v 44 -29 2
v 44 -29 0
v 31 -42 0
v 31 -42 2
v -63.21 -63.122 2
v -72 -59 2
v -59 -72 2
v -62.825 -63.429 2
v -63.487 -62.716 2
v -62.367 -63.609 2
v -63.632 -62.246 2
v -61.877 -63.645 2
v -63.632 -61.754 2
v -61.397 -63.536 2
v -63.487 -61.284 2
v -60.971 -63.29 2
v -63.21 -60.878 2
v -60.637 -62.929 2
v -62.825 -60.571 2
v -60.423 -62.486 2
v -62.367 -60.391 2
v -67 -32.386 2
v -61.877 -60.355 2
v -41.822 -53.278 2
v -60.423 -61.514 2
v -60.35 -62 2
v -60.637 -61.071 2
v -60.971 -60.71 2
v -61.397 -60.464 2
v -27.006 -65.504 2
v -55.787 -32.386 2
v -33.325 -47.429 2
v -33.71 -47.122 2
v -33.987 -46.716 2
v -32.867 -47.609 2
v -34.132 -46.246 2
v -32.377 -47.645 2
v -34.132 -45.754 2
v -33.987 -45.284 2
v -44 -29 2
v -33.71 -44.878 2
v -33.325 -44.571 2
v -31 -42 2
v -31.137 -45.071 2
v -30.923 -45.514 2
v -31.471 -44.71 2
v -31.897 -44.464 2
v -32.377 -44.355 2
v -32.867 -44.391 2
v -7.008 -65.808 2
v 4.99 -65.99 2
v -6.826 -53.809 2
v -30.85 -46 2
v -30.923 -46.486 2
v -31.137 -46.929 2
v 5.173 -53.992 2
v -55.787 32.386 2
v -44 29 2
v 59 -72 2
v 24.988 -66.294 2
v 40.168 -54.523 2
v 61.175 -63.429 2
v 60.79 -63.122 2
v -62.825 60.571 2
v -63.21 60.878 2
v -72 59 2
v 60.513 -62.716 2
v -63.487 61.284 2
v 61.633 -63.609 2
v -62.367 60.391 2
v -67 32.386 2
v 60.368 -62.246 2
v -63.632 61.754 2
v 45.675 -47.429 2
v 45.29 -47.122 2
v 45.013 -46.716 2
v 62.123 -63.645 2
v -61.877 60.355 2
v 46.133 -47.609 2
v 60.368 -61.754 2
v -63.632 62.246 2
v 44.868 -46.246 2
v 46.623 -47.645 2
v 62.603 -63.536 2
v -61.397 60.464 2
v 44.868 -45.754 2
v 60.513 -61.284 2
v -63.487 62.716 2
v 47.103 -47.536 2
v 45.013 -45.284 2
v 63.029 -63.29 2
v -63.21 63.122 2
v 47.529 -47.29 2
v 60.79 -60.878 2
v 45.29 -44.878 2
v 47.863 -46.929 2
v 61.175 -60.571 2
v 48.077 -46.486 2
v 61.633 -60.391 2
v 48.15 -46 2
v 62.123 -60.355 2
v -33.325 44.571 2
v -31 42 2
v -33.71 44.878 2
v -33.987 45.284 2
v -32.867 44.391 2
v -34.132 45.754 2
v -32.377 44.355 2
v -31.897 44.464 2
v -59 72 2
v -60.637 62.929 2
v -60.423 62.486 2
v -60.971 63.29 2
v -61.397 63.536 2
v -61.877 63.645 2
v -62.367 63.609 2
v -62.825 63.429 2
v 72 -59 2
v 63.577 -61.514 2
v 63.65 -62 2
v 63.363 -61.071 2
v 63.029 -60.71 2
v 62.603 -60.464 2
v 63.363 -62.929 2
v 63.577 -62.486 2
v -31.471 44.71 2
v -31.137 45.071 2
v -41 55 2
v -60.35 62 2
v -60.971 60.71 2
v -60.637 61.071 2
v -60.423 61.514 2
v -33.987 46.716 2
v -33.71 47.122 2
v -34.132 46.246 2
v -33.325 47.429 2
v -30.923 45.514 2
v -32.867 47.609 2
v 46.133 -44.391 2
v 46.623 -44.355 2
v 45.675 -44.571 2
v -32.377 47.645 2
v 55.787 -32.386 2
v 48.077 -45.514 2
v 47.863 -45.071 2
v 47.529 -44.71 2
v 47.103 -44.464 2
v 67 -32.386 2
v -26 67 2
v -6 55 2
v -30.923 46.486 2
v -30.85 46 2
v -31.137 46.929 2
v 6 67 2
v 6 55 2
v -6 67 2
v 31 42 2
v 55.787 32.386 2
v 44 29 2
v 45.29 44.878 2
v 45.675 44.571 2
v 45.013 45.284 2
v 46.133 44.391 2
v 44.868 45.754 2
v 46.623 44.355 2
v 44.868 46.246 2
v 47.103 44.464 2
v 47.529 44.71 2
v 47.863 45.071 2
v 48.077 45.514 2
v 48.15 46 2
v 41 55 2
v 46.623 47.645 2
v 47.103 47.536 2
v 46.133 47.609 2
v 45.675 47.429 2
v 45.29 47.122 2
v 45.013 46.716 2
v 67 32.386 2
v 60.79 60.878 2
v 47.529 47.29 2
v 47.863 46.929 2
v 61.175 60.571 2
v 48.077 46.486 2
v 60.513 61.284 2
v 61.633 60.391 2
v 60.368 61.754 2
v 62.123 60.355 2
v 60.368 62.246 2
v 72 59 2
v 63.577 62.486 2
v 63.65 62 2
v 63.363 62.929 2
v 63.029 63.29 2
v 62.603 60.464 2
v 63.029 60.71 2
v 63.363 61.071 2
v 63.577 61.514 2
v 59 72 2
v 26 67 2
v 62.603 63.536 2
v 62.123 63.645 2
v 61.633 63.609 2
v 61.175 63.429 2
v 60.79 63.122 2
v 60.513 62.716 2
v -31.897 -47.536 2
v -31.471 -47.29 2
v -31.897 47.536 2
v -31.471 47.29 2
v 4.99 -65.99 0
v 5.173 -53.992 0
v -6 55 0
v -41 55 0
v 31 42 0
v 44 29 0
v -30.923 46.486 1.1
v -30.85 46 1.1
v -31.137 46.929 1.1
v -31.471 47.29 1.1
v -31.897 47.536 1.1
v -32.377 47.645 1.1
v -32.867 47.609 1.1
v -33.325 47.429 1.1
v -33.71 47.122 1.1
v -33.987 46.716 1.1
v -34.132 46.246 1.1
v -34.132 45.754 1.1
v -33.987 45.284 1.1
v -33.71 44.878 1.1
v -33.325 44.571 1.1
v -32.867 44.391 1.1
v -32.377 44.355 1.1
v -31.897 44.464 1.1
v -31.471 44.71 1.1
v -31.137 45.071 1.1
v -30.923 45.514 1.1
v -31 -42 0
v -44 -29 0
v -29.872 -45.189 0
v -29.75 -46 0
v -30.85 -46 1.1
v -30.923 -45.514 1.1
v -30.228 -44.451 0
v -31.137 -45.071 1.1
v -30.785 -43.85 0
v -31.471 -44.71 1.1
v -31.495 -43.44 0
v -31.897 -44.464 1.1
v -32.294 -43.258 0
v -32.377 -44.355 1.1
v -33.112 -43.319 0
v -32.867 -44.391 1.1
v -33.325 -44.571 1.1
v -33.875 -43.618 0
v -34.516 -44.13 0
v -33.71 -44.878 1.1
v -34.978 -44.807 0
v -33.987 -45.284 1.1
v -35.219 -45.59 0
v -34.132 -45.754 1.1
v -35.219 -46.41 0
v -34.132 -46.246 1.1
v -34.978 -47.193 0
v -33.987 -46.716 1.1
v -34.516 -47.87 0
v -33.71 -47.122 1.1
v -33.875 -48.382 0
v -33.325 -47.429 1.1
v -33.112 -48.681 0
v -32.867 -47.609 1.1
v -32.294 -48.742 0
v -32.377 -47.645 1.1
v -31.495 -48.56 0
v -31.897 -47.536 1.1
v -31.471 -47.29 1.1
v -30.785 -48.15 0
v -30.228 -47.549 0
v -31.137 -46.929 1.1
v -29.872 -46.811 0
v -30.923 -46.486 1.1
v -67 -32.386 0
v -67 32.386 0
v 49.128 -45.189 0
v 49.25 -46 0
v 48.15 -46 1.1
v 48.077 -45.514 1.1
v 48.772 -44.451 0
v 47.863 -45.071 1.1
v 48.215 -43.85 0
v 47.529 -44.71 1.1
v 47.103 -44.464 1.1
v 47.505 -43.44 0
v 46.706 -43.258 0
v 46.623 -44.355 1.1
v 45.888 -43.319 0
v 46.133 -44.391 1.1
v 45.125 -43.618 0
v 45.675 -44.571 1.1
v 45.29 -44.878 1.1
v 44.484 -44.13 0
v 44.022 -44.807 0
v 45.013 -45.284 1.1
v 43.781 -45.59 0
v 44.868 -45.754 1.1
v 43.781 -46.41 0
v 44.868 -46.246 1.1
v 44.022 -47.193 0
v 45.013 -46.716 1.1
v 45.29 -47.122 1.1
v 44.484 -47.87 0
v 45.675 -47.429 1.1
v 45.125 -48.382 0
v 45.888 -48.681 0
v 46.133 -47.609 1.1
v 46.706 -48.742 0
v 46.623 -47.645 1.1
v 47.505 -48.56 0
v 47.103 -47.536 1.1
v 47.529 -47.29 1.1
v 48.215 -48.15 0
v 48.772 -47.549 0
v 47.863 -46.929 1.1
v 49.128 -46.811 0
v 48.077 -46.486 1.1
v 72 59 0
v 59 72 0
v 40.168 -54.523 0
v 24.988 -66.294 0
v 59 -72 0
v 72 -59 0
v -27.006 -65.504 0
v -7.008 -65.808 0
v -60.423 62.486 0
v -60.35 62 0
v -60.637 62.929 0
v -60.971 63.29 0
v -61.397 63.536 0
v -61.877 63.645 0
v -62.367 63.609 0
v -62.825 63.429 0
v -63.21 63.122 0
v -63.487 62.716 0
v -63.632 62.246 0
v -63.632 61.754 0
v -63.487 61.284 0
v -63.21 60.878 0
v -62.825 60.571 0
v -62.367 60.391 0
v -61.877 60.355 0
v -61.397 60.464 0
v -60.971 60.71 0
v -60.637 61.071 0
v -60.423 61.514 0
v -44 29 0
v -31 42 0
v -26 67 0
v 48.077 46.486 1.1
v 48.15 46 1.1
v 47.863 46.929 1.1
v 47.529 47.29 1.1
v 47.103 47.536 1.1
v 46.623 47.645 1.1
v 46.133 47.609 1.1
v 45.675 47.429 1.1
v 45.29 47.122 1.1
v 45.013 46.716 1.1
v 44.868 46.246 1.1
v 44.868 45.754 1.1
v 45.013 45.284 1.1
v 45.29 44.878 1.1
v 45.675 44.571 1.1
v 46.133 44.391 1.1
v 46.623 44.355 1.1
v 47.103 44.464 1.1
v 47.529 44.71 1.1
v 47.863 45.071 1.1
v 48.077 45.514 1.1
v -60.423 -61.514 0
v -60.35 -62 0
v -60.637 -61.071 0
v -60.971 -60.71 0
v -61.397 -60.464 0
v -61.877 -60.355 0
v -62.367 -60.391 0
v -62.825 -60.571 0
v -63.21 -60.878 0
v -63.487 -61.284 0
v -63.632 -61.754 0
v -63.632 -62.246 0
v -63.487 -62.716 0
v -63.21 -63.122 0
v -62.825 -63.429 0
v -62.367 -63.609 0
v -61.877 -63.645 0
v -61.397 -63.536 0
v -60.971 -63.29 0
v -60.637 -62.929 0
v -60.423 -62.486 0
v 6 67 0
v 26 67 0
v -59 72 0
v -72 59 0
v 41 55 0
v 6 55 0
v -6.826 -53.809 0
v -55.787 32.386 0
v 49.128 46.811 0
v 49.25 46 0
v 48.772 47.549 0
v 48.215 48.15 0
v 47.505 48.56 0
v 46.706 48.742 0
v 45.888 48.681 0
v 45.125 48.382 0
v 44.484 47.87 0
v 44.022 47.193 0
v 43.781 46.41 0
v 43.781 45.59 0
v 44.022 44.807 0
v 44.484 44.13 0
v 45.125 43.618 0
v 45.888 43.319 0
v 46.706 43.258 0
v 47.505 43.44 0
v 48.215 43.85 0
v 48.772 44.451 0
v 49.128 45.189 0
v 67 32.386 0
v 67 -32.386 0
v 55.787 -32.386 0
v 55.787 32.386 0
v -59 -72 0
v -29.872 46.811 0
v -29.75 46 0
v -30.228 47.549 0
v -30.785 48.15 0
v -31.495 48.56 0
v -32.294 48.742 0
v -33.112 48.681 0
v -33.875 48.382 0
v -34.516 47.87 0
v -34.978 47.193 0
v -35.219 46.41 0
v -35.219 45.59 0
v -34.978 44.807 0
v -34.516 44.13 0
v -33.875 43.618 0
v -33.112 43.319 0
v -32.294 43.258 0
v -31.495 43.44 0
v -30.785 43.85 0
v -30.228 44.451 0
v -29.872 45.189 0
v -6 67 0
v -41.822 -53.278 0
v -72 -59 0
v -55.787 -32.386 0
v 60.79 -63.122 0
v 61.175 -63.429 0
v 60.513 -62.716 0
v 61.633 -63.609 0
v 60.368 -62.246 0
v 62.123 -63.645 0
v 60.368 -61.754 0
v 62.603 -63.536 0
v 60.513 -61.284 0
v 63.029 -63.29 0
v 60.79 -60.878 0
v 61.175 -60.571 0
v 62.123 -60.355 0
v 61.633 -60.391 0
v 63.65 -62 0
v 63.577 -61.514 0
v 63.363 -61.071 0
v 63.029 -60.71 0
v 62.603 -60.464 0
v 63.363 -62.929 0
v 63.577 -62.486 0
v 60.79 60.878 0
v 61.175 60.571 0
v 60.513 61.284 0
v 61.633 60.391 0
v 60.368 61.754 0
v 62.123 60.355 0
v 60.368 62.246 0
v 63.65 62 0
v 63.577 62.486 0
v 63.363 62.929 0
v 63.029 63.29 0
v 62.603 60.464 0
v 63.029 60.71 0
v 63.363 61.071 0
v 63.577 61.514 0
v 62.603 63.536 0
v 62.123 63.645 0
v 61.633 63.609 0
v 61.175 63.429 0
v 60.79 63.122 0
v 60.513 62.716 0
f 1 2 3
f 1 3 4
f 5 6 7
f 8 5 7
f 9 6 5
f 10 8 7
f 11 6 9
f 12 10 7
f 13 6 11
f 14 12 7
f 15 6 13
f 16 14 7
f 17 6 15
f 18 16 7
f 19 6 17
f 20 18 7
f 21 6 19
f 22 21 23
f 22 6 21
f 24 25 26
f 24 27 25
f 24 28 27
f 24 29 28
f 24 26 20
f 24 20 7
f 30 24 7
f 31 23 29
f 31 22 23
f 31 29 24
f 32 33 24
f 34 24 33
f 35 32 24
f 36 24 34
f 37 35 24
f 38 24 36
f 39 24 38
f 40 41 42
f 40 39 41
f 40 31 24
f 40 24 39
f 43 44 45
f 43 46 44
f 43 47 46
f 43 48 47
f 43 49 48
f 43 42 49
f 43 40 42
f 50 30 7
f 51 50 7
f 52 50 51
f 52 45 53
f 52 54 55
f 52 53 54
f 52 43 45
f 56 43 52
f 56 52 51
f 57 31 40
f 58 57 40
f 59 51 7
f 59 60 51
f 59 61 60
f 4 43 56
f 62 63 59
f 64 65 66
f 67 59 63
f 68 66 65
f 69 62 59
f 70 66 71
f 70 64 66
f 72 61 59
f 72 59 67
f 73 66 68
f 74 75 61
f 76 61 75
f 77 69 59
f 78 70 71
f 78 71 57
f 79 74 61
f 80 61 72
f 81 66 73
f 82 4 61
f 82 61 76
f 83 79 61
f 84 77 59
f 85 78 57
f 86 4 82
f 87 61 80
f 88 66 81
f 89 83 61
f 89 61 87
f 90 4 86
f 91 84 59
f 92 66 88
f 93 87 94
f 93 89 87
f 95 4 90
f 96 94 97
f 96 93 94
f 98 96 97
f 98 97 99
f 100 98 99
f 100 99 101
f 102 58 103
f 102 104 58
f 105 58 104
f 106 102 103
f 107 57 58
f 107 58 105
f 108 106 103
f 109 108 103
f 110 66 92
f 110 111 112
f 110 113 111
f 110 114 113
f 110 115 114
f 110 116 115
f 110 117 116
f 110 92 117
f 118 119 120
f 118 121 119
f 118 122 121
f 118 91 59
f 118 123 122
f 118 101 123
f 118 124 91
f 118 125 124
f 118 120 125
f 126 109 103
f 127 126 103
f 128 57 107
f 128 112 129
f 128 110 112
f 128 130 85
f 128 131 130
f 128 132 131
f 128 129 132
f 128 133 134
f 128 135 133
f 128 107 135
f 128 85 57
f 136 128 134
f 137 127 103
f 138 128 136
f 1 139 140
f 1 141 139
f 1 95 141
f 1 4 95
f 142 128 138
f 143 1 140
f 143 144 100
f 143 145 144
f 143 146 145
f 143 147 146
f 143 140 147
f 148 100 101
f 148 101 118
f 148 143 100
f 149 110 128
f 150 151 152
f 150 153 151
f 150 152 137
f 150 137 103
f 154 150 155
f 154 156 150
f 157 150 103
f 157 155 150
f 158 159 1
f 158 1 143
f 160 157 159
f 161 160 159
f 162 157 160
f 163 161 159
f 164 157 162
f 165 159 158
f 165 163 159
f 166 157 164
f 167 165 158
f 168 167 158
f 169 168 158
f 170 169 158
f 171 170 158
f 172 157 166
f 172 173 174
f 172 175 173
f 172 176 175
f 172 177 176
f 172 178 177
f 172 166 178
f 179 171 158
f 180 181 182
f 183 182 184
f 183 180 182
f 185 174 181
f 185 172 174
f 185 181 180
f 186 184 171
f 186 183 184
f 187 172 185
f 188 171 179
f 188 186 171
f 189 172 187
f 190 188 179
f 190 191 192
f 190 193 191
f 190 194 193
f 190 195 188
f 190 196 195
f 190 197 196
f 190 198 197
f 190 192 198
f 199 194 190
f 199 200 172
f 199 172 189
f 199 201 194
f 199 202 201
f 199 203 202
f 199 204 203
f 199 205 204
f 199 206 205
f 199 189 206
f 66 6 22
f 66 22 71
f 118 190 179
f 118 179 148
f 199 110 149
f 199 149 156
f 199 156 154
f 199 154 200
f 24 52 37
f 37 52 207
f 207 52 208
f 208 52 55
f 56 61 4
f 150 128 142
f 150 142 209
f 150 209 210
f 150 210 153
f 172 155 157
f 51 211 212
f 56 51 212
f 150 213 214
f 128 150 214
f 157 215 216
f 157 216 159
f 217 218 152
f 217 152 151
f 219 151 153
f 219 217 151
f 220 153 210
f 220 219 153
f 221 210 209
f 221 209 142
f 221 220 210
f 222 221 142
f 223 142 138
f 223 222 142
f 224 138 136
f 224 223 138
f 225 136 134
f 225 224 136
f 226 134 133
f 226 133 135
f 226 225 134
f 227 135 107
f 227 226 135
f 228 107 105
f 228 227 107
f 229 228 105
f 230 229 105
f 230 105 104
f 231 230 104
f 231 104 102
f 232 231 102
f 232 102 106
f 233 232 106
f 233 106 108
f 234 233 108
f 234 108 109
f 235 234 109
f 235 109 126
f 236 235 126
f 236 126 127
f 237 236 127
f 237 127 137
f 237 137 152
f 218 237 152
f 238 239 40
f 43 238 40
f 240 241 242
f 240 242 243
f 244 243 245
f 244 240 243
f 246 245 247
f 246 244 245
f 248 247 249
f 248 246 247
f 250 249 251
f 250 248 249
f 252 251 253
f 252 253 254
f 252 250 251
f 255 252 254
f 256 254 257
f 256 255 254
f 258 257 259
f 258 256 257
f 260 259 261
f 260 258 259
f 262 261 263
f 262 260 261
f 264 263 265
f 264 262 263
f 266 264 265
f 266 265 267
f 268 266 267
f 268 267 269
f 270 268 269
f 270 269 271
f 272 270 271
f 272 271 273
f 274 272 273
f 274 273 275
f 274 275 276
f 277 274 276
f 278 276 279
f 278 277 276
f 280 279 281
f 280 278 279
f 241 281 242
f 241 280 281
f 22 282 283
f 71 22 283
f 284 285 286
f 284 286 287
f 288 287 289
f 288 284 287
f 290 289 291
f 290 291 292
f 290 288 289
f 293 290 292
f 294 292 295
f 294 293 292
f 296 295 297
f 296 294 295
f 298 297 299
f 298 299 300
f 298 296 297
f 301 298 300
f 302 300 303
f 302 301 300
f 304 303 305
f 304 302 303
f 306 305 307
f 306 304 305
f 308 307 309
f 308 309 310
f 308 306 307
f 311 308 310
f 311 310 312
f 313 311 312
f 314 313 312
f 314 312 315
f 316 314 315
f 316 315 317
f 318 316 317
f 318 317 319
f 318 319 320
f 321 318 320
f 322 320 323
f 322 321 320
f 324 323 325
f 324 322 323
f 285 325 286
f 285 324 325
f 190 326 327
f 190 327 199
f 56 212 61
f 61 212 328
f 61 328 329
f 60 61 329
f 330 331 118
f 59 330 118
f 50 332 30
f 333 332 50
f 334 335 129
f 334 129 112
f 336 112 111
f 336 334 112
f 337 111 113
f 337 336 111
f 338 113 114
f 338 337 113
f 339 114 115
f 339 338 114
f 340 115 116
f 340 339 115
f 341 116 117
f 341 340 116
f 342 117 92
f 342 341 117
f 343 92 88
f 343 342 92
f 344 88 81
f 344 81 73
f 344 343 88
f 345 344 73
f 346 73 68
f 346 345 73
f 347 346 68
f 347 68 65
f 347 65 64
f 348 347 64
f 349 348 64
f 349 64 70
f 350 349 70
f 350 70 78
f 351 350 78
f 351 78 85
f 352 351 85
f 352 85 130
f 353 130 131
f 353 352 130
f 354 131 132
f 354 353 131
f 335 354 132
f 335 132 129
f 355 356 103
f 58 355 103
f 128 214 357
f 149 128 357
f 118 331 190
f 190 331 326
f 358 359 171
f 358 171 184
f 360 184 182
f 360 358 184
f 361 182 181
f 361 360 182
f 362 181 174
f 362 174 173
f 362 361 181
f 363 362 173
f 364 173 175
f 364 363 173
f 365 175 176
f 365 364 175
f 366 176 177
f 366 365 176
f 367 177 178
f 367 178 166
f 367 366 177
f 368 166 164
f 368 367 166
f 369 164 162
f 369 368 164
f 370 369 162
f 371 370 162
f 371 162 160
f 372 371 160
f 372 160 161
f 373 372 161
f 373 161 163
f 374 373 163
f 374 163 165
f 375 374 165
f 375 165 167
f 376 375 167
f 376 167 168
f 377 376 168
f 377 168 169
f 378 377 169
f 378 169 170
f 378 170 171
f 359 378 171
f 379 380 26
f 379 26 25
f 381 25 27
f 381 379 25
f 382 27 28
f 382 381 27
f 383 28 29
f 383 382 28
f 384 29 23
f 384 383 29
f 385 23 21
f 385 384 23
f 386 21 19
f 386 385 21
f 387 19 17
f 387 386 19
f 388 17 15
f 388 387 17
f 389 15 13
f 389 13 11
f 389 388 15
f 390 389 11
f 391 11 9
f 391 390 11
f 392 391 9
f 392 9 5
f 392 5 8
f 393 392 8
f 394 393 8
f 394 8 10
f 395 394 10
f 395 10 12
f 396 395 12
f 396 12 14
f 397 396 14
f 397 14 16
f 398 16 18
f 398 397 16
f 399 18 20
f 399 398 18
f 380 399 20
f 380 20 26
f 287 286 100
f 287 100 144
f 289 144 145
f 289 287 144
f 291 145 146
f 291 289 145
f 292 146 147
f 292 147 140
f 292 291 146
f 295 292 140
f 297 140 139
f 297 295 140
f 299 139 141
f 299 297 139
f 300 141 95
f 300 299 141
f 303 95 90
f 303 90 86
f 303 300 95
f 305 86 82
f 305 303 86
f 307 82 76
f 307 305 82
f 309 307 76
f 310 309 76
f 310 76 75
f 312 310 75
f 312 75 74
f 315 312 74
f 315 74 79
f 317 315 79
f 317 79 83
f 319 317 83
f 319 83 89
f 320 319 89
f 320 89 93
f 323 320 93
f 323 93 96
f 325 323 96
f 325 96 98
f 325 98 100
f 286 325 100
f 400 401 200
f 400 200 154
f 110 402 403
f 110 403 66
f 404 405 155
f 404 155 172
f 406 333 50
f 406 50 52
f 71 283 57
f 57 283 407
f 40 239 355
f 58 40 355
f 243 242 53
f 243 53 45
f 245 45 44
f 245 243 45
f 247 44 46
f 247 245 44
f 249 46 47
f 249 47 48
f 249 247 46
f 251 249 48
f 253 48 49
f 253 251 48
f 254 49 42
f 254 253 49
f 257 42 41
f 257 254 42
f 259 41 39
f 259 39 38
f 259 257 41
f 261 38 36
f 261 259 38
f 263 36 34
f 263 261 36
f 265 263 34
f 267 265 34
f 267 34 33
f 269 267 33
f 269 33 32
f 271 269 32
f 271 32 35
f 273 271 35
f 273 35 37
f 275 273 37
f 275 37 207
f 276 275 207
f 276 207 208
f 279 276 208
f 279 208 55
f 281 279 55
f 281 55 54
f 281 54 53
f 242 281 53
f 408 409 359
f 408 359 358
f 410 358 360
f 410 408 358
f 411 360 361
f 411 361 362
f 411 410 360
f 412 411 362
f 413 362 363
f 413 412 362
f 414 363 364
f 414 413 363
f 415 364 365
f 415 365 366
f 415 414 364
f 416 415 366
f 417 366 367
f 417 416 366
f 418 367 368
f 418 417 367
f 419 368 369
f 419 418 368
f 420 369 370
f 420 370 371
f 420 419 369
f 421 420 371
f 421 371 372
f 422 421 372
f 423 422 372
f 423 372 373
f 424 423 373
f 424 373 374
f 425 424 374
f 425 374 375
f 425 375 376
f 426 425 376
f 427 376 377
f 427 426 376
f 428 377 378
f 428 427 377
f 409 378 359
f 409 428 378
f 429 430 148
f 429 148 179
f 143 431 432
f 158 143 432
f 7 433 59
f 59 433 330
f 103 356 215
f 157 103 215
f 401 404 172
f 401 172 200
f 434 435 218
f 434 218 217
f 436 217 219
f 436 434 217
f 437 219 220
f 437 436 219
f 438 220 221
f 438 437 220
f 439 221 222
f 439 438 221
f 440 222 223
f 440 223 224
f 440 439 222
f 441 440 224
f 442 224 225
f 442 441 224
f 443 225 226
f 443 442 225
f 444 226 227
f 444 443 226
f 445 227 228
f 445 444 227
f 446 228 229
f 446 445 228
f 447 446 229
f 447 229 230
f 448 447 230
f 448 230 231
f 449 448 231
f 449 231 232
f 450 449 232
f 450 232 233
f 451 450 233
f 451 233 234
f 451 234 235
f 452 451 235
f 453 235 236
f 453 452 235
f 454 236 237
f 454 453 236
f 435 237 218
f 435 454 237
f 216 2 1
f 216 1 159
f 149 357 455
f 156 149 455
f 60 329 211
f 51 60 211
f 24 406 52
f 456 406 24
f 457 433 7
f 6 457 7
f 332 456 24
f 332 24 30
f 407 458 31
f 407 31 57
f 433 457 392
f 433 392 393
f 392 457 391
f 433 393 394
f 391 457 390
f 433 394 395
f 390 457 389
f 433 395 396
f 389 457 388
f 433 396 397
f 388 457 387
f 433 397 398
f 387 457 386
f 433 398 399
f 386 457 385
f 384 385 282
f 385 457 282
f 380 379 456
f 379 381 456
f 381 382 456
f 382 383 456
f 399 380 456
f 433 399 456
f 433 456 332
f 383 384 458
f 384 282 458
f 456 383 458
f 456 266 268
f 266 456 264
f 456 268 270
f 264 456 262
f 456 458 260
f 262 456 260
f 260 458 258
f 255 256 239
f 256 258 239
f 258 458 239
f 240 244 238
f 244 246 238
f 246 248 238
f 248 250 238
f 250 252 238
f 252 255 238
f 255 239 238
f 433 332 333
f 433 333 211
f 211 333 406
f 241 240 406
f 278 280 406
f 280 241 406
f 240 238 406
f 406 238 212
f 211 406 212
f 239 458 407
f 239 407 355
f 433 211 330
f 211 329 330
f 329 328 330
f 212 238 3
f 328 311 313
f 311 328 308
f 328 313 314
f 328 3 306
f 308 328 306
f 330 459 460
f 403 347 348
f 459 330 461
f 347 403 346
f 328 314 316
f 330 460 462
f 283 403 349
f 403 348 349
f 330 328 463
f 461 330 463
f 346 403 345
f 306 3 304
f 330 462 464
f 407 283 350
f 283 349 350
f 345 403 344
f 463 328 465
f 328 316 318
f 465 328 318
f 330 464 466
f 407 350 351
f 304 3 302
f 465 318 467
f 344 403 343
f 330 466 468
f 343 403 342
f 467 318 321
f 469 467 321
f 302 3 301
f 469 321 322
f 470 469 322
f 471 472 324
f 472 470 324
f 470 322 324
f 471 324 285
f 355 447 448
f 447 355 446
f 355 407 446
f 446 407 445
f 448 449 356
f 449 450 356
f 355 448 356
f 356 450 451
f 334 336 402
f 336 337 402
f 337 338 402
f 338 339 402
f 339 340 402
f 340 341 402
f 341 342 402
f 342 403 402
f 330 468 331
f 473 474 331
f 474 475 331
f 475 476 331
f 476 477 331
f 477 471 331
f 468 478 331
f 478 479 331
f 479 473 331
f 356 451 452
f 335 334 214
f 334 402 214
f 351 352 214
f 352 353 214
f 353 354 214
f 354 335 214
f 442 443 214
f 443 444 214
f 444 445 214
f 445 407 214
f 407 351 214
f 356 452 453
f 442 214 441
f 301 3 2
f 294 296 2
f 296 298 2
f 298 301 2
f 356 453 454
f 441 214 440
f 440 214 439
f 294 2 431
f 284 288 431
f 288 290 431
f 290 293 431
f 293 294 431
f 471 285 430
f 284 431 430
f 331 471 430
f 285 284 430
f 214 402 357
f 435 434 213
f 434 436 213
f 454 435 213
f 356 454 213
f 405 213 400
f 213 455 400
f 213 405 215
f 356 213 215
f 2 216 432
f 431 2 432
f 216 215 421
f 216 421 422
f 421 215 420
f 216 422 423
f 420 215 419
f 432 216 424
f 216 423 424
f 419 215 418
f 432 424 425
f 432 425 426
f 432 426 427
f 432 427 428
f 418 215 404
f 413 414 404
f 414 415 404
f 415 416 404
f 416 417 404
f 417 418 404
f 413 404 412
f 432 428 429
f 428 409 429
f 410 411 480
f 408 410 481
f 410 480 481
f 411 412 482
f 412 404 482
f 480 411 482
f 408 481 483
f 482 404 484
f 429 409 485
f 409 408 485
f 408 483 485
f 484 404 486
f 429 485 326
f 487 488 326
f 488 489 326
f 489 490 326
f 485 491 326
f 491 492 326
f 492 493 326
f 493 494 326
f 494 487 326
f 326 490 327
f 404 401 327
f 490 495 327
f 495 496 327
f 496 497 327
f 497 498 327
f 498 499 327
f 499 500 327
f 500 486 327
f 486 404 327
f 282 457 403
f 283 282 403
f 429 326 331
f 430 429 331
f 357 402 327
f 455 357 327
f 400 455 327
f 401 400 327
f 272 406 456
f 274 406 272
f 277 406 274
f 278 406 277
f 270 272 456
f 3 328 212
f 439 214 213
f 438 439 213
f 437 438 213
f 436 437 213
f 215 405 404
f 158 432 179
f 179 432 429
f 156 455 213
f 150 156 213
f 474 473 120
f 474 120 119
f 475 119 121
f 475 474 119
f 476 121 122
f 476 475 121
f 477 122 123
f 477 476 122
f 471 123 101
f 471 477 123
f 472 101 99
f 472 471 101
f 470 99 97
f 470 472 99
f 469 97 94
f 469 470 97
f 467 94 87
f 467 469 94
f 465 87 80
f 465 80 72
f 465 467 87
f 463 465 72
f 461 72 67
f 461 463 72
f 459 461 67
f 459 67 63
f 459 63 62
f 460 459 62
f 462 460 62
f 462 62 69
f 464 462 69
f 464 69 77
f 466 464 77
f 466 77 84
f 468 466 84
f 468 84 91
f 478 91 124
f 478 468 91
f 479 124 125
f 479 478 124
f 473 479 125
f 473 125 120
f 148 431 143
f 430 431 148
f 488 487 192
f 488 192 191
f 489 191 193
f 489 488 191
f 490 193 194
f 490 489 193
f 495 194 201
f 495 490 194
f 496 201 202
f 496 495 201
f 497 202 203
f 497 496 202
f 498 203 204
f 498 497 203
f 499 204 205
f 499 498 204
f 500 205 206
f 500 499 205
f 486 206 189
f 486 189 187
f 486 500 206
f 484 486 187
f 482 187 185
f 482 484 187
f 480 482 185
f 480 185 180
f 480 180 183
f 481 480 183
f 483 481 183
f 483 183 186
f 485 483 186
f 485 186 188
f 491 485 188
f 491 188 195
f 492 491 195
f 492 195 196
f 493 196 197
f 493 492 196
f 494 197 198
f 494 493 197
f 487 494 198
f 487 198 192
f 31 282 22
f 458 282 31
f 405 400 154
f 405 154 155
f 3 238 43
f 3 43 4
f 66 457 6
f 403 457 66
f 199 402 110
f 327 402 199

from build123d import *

# Parameters (mm, degrees)
SKETCH_1_W                     = 144
SKETCH_1_H                     = 144
SKETCH_1_R                     = 1.65
SKETCH_1_W_2                   = 11.212967435
SKETCH_1_H_2                   = 64.771297792
SKETCH_1_W_3                   = 88
SKETCH_1_H_3                   = 84
EXTRUDE_79X92_DEPTH            = 2
SKETCH_2_R                     = 2.75
M3_D5P5_1P1_90_DEPTH           = 1.1
M3_D5P5_1P1_90_DRAFT           = 45
M3_D5P5_1P1_90_PROFILE_2_DEPTH = 1.1
M3_D5P5_1P1_90_PROFILE_2_DRAFT = 45
M3_D5P5_1P1_90_PROFILE_3_DEPTH = 1.1
M3_D5P5_1P1_90_PROFILE_3_DRAFT = 45
M3_D5P5_1P1_90_PROFILE_4_DEPTH = 1.1
M3_D5P5_1P1_90_PROFILE_4_DRAFT = 45
CHAMFER_1_SIZE                 = 13


with BuildPart() as part:
    # 草图1 → 几何镂空托板_原装79x92孔距 (new body)
    with BuildSketch(Plane.XY):
        Rectangle(SKETCH_1_W, SKETCH_1_H)
        with Locations((-62, -62)):
            Circle(SKETCH_1_R, mode=Mode.SUBTRACT)
        with Locations((-62, 62)):
            Circle(SKETCH_1_R, mode=Mode.SUBTRACT)
        with Locations((62, -62)):
            Circle(SKETCH_1_R, mode=Mode.SUBTRACT)
        with Locations((62, 62)):
            Circle(SKETCH_1_R, mode=Mode.SUBTRACT)
        with Locations((-32.5, -46)):
            Circle(SKETCH_1_R, mode=Mode.SUBTRACT)
        with Locations((-32.5, 46)):
            Circle(SKETCH_1_R, mode=Mode.SUBTRACT)
        with Locations((46.5, -46)):
            Circle(SKETCH_1_R, mode=Mode.SUBTRACT)
        with Locations((46.5, 46)):
            Circle(SKETCH_1_R, mode=Mode.SUBTRACT)
        Polygon((-26, 67), (-6, 67), (-6, 55), (-41, 55), align=None, mode=Mode.SUBTRACT)
        Polygon((4.990317383, -65.990169234), (5.172518716, -53.991552536), (40.168484086, -54.52297309), (24.98801188, -66.293838123), align=None, mode=Mode.SUBTRACT)
        Polygon((-7.008299316, -65.807967901), (-6.826097982, -53.809351203), (-41.822063353, -53.277930648), (-27.005993813, -65.504299013), align=None, mode=Mode.SUBTRACT)
        with Locations((61.393516283, 0)):
            Rectangle(SKETCH_1_W_2, SKETCH_1_H_2, mode=Mode.SUBTRACT)
        with Locations((-61.393516283, 0)):
            Rectangle(SKETCH_1_W_2, SKETCH_1_H_2, mode=Mode.SUBTRACT)
        Rectangle(SKETCH_1_W_3, SKETCH_1_H_3, mode=Mode.SUBTRACT)
        Polygon((6, 55), (41, 55), (26, 67), (6, 67), align=None, mode=Mode.SUBTRACT)
    extrude(amount=EXTRUDE_79X92_DEPTH)


with BuildPart() as m3_d5p5_1p1_90_tool:
    # 草图2 → M3沉头四孔_D5p5_深1p1_90度 (with draft: the straight prism first)
    with BuildSketch(Plane.XY):
        with Locations((-32.5, -46)):
            Circle(SKETCH_2_R)
    extrude(amount=M3_D5P5_1P1_90_DEPTH)
    # M3沉头四孔_D5p5_深1p1_90度: the draft: its side faces are tilted about the plane it starts from
    m3_d5p5_1p1_90_sides = [m3_d5p5_1p1_90_tool.faces().sort_by_distance(p)[0] for p in [
        (-35.25, -46, 0.55),
    ]]
    draft(m3_d5p5_1p1_90_sides, Plane.XY, M3_D5P5_1P1_90_DRAFT)


with BuildPart() as part_1:
    add(part.part)

    # M3沉头四孔_D5p5_深1p1_90度: cut by m3_d5p5_1p1_90_tool
    add(m3_d5p5_1p1_90_tool.part, mode=Mode.SUBTRACT)


with BuildPart() as m3_d5p5_1p1_90_profile_2_tool:
    # 草图2 → M3沉头四孔_D5p5_深1p1_90度 profile 2 (with draft: the straight prism first)
    with BuildSketch(Plane.XY):
        with Locations((-32.5, 46)):
            Circle(SKETCH_2_R)
    extrude(amount=M3_D5P5_1P1_90_PROFILE_2_DEPTH)
    # M3沉头四孔_D5p5_深1p1_90度 profile 2: the draft: its side faces are tilted about the plane it starts from
    m3_d5p5_1p1_90_profile_2_sides = [m3_d5p5_1p1_90_profile_2_tool.faces().sort_by_distance(p)[0] for p in [
        (-35.25, 46, 0.55),
    ]]
    draft(m3_d5p5_1p1_90_profile_2_sides, Plane.XY, M3_D5P5_1P1_90_PROFILE_2_DRAFT)


with BuildPart() as part_2:
    add(part_1.part)

    # M3沉头四孔_D5p5_深1p1_90度 profile 2: cut by m3_d5p5_1p1_90_profile_2_tool
    add(m3_d5p5_1p1_90_profile_2_tool.part, mode=Mode.SUBTRACT)


with BuildPart() as m3_d5p5_1p1_90_profile_3_tool:
    # 草图2 → M3沉头四孔_D5p5_深1p1_90度 profile 3 (with draft: the straight prism first)
    with BuildSketch(Plane.XY):
        with Locations((46.5, -46)):
            Circle(SKETCH_2_R)
    extrude(amount=M3_D5P5_1P1_90_PROFILE_3_DEPTH)
    # M3沉头四孔_D5p5_深1p1_90度 profile 3: the draft: its side faces are tilted about the plane it starts from
    m3_d5p5_1p1_90_profile_3_sides = [m3_d5p5_1p1_90_profile_3_tool.faces().sort_by_distance(p)[0] for p in [
        (43.75, -46, 0.55),
    ]]
    draft(m3_d5p5_1p1_90_profile_3_sides, Plane.XY, M3_D5P5_1P1_90_PROFILE_3_DRAFT)


with BuildPart() as part_3:
    add(part_2.part)

    # M3沉头四孔_D5p5_深1p1_90度 profile 3: cut by m3_d5p5_1p1_90_profile_3_tool
    add(m3_d5p5_1p1_90_profile_3_tool.part, mode=Mode.SUBTRACT)


with BuildPart() as m3_d5p5_1p1_90_profile_4_tool:
    # 草图2 → M3沉头四孔_D5p5_深1p1_90度 profile 4 (with draft: the straight prism first)
    with BuildSketch(Plane.XY):
        with Locations((46.5, 46)):
            Circle(SKETCH_2_R)
    extrude(amount=M3_D5P5_1P1_90_PROFILE_4_DEPTH)
    # M3沉头四孔_D5p5_深1p1_90度 profile 4: the draft: its side faces are tilted about the plane it starts from
    m3_d5p5_1p1_90_profile_4_sides = [m3_d5p5_1p1_90_profile_4_tool.faces().sort_by_distance(p)[0] for p in [
        (43.75, 46, 0.55),
    ]]
    draft(m3_d5p5_1p1_90_profile_4_sides, Plane.XY, M3_D5P5_1P1_90_PROFILE_4_DRAFT)


with BuildPart() as part_4:
    add(part_3.part)

    # M3沉头四孔_D5p5_深1p1_90度 profile 4: cut by m3_d5p5_1p1_90_profile_4_tool
    add(m3_d5p5_1p1_90_profile_4_tool.part, mode=Mode.SUBTRACT)

    # 倒角1
    chamfer_1_edges = [part_4.edges().sort_by_distance(p)[0] for p in [
        (-72, 72, 1),
        (72, 72, 1),
        (-44, 42, 1),
        (72, -72, 1),
        (-44, -42, 1),
        (44, -42, 1),
        (44, 42, 1),
        (-72, -72, 1),
    ]]
    chamfer(chamfer_1_edges, length=CHAMFER_1_SIZE)


solid = part_4.part
